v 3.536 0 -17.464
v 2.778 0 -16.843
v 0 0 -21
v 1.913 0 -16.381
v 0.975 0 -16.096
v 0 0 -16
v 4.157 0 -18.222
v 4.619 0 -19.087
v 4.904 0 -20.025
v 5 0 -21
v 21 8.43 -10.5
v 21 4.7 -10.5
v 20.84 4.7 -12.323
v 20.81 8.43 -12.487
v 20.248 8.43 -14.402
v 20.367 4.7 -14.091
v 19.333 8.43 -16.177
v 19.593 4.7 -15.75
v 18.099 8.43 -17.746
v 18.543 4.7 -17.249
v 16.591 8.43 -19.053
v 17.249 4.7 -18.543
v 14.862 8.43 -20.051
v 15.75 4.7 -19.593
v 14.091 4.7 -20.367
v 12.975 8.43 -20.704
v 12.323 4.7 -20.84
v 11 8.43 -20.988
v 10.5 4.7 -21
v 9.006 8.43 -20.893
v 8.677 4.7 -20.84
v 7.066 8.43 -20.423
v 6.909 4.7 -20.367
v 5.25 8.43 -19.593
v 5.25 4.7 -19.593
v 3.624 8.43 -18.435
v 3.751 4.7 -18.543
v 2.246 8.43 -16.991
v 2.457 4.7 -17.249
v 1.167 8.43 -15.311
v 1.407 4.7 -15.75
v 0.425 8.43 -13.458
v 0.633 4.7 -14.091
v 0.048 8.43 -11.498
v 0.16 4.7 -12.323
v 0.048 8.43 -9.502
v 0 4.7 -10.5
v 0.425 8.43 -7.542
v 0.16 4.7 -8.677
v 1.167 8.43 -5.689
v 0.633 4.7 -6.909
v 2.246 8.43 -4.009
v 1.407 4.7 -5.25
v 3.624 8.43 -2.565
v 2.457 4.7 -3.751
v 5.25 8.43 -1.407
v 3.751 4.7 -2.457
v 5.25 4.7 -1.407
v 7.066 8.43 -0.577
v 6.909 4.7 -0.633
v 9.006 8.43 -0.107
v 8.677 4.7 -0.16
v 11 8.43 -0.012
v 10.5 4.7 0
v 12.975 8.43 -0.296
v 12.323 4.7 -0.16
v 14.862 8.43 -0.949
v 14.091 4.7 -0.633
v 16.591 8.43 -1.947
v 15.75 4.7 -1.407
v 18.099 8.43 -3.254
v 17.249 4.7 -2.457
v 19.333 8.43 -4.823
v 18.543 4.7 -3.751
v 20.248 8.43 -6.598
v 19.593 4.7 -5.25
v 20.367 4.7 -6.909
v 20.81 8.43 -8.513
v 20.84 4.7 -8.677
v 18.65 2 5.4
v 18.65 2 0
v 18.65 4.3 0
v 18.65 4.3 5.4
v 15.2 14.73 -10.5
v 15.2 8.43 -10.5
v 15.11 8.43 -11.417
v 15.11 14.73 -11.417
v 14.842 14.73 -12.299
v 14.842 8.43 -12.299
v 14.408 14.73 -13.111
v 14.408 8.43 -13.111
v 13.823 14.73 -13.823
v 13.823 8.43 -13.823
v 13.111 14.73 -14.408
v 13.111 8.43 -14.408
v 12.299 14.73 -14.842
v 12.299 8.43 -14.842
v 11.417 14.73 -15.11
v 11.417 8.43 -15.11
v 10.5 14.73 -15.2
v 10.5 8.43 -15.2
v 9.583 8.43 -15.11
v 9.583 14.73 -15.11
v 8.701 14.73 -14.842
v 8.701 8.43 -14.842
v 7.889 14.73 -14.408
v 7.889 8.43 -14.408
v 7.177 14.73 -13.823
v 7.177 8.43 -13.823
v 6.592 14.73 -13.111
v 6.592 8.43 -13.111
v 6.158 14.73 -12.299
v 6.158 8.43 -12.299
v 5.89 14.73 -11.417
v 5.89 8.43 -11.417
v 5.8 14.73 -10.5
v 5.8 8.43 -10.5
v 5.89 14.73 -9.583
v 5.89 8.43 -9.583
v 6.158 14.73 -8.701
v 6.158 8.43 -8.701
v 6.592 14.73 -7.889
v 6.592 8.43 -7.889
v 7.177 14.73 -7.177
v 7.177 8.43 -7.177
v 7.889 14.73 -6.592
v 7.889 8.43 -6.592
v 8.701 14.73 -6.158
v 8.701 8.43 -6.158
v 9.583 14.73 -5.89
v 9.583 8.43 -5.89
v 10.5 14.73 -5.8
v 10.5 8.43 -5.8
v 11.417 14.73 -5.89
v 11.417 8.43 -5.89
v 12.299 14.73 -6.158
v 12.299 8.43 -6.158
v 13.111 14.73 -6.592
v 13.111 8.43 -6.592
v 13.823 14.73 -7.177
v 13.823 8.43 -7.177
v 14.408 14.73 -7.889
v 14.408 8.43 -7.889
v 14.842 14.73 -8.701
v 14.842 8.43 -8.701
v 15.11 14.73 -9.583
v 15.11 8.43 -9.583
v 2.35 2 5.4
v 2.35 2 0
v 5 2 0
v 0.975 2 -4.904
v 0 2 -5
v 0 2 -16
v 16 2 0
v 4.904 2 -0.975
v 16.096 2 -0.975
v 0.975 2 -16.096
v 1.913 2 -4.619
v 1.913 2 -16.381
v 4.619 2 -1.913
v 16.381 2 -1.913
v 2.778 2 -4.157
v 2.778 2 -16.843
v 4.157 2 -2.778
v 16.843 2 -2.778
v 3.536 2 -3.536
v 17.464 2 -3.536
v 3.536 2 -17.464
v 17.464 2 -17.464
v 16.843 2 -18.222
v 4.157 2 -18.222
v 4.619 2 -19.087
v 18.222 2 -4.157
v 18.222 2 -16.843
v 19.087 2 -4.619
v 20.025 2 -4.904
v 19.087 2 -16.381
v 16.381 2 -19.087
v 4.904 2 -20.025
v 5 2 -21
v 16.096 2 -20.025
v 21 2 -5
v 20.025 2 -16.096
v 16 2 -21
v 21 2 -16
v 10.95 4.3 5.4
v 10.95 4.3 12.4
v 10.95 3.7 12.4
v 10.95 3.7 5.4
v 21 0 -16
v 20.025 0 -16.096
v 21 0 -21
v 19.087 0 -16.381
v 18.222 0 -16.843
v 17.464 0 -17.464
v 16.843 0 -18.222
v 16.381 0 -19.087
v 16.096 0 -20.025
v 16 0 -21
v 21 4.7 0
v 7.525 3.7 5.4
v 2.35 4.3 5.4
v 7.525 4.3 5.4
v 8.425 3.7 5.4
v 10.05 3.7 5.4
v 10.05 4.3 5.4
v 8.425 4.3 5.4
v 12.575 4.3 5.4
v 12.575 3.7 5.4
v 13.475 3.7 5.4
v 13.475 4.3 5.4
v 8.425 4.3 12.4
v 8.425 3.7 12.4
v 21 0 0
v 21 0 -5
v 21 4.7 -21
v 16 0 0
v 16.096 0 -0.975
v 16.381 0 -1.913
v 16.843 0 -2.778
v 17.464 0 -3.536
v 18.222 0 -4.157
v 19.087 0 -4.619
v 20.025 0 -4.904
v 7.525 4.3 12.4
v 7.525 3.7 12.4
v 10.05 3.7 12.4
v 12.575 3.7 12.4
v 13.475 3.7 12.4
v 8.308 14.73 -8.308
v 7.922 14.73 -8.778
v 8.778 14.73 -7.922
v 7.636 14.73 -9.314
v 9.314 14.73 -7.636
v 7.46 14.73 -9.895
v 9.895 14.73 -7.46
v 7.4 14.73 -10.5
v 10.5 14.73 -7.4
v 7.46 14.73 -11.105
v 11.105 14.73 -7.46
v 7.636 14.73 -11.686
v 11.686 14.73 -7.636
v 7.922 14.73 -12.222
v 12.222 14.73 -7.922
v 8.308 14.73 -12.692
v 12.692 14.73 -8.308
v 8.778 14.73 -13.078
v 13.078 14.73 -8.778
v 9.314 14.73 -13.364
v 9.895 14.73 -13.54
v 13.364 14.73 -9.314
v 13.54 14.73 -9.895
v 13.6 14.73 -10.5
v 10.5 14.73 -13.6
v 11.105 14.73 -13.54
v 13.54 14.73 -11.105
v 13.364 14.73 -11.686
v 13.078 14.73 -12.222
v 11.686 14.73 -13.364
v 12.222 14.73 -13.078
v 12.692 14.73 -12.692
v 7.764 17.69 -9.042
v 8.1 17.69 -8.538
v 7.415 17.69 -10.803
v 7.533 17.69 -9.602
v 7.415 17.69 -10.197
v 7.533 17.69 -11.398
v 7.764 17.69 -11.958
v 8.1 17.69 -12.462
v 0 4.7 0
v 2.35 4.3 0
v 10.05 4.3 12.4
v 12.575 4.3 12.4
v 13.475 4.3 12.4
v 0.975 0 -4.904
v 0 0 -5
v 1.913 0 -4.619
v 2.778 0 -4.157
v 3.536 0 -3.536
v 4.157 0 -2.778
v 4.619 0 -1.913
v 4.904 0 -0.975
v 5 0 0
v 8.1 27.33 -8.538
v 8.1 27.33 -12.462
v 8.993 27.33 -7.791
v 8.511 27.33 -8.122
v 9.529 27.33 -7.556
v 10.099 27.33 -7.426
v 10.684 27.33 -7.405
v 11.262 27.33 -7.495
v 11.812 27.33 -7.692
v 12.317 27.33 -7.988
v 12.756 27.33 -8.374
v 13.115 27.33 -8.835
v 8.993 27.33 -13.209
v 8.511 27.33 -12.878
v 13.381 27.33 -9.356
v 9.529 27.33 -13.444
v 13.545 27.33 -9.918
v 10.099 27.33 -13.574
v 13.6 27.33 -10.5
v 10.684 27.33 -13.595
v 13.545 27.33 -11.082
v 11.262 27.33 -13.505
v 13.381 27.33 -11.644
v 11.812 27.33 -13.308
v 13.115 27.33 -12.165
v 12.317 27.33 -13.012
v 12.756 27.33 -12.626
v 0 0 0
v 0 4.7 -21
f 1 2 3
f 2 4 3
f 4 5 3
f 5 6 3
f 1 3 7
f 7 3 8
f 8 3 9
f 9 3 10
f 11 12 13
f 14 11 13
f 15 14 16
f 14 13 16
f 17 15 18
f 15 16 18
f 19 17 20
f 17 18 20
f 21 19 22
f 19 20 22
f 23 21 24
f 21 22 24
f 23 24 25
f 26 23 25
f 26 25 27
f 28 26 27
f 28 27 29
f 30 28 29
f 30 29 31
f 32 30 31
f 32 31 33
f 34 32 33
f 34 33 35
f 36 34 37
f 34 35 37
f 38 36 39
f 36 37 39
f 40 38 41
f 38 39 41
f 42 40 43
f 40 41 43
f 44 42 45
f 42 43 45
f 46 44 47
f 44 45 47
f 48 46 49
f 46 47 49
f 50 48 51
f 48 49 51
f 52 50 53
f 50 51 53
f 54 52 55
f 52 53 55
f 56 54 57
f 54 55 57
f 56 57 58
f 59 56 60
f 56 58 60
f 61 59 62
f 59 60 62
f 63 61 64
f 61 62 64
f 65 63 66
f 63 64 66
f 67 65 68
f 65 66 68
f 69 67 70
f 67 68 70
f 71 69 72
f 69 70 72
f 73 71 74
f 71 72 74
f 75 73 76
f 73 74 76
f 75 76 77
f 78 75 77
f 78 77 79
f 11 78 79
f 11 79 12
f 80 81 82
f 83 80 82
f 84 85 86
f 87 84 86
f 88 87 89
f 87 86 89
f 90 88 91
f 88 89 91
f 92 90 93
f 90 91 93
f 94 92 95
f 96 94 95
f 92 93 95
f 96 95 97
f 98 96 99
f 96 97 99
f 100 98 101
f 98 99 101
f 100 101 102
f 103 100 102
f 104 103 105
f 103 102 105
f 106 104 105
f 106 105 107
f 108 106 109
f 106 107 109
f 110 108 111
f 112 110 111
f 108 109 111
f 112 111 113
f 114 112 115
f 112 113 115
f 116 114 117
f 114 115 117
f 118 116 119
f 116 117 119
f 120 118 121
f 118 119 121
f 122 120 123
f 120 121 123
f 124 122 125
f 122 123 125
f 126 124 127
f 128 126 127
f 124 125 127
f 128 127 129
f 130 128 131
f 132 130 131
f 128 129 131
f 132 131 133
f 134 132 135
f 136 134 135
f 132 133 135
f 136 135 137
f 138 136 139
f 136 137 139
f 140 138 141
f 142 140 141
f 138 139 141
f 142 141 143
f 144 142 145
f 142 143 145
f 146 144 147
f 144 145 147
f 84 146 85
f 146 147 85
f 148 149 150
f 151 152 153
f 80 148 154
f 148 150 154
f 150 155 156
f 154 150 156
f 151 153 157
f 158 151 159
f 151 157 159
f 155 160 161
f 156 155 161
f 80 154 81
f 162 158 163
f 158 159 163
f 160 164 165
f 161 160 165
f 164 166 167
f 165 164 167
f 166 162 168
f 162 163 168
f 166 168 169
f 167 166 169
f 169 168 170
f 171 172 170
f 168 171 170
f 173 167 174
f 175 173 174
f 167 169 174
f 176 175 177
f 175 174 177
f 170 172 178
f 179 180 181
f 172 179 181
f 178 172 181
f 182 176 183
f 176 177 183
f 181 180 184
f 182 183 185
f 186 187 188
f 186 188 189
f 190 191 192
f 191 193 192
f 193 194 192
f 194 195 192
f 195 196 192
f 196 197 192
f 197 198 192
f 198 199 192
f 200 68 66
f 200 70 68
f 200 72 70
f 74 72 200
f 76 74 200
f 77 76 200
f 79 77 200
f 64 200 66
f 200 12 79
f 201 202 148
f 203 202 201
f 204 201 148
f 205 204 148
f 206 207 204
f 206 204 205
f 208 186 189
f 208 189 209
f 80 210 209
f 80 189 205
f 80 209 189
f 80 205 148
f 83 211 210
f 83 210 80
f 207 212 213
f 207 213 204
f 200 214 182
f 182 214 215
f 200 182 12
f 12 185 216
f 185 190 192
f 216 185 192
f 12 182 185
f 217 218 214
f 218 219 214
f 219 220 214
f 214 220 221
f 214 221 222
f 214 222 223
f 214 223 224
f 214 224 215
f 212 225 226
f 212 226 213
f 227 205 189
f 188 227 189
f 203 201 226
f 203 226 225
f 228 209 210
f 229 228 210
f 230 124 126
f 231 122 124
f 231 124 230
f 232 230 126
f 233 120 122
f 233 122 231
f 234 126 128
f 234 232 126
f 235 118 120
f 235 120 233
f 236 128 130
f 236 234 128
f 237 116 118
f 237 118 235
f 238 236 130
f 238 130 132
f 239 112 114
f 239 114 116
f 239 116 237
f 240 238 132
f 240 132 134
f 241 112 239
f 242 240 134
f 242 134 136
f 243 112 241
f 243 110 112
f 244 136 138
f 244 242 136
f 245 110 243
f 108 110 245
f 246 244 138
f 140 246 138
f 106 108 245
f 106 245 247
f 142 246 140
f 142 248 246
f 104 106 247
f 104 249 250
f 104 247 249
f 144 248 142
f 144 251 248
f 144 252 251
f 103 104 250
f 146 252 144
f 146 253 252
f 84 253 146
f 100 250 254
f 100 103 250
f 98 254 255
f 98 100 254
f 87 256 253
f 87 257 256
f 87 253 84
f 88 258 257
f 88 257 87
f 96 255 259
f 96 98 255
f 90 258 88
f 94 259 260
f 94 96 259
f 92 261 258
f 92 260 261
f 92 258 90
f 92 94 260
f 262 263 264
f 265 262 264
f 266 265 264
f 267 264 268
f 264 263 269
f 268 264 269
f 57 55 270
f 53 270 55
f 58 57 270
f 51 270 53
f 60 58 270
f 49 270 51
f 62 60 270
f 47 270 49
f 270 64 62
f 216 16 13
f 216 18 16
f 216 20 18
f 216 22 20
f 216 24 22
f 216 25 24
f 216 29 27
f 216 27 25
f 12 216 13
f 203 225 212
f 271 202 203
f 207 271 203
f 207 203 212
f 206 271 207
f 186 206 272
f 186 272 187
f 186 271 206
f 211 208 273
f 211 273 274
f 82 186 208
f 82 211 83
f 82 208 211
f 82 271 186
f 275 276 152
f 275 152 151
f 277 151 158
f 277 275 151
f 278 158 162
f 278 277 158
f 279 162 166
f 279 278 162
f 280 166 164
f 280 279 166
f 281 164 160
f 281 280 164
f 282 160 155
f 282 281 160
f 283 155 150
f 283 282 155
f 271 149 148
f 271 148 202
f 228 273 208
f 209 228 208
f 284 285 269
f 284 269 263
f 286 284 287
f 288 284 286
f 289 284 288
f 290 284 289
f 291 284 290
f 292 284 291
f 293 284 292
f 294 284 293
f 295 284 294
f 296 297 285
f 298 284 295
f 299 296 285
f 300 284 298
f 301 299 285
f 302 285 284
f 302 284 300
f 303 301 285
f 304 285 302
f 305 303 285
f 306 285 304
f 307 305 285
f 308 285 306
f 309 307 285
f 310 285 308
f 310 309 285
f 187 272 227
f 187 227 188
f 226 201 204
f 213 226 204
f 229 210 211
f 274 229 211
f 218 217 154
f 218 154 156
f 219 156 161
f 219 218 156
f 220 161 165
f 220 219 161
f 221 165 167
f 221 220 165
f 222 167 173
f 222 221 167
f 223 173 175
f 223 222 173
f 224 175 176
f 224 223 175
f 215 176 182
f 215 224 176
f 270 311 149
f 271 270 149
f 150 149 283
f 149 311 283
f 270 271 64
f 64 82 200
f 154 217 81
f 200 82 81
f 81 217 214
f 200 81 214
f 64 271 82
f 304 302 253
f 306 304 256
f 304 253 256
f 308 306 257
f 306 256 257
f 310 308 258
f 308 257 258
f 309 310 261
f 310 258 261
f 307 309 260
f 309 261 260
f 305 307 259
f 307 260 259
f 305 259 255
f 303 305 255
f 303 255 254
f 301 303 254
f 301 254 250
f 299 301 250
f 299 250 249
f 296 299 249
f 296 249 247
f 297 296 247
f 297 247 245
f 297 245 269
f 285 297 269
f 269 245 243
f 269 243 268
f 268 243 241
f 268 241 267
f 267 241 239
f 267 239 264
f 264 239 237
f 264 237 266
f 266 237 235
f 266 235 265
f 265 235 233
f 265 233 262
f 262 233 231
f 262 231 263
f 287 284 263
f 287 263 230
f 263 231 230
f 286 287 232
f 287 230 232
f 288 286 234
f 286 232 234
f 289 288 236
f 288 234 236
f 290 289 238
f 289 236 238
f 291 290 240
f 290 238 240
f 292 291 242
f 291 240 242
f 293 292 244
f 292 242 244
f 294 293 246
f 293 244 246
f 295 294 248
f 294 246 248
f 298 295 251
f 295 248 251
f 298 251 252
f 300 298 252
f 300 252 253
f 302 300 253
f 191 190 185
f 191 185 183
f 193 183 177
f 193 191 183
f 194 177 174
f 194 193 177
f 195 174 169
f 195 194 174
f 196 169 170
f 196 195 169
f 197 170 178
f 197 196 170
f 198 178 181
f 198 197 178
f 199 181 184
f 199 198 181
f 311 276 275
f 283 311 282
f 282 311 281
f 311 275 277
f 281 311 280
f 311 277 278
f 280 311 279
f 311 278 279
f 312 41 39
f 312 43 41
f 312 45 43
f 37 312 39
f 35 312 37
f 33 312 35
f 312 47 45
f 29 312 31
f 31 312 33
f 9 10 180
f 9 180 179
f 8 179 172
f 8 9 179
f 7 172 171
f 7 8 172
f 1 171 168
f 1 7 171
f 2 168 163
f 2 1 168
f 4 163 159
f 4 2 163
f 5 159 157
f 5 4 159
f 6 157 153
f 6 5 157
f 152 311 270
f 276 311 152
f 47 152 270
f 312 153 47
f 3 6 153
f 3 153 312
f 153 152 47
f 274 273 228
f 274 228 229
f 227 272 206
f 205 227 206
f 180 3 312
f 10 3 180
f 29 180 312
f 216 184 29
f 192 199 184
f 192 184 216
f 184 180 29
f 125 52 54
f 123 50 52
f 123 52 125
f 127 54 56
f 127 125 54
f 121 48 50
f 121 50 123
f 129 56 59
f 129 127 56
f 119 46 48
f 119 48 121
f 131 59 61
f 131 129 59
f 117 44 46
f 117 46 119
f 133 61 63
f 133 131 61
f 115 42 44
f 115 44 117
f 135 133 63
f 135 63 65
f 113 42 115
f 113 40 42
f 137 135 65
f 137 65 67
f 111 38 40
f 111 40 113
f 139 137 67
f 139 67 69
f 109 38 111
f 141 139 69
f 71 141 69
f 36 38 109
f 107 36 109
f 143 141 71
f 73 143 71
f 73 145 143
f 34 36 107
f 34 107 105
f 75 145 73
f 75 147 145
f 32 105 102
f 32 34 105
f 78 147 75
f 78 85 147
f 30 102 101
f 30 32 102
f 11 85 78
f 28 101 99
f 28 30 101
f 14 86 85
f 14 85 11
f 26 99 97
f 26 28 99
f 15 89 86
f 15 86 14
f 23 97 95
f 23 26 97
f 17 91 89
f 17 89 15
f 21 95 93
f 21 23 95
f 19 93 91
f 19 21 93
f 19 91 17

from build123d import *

# Parameters (mm, degrees)
SKETCH1_W               = 21
SKETCH1_H               = 21
BOSS_EXTRUDE1_DEPTH     = 4.7
SKETCH2_R               = 10.5
BOSS_EXTRUDE2_DEPTH     = 3.73
SKETCH3_R               = 4.7
BOSS_EXTRUDE3_DEPTH     = 6.3
SKETCH4_R               = 3.1
BOSS_EXTRUDE4_DEPTH     = 12.6
CUT_EXTRUDE1_DEPTH      = 2
SKETCH6_W               = 16.3
SKETCH6_H               = 2.3
BOSS_EXTRUDE5_DEPTH     = 5.4
SKETCH7_W               = 5.95
SKETCH7_H               = 0.6
BOSS_EXTRUDE6_DEPTH     = 7
SKETCH8_W               = 1.625
SKETCH8_H               = 7
CUT_EXTRUDE2_DEPTH      = 24.03
CUT_EXTRUDE2_DEPTH_BACK = 5.3
CUT_EXTRUDE3_DEPTH      = 9.64


with BuildPart() as part:
    # Sketch1 → Boss-Extrude1 (new body)
    with BuildSketch(Plane(origin=(0, 0, 0), x_dir=(1, 0, 0), z_dir=(0, 1, 0))):
        with Locations((10.5, 10.5)):
            Rectangle(SKETCH1_W, SKETCH1_H)
    extrude(amount=BOSS_EXTRUDE1_DEPTH)

    # Sketch2 → Boss-Extrude2 (add)
    with BuildSketch(Plane(origin=(0, 4.7, 0), x_dir=(1, 0, 0), z_dir=(0, 1, 0))):
        with Locations((10.5, 10.5)):
            Circle(SKETCH2_R)
    extrude(amount=BOSS_EXTRUDE2_DEPTH)

    # Sketch3 → Boss-Extrude3 (add)
    with BuildSketch(Plane(origin=(0, 8.43, 0), x_dir=(1, 0, 0), z_dir=(0, 1, 0))):
        with Locations((10.5, 10.5)):
            Circle(SKETCH3_R)
    extrude(amount=BOSS_EXTRUDE3_DEPTH)

    # Sketch4 → Boss-Extrude4 (add)
    with BuildSketch(Plane(origin=(0, 14.73, 0), x_dir=(1, 0, 0), z_dir=(0, 1, 0))):
        with Locations((10.5, 10.5)):
            Circle(SKETCH4_R)
    extrude(amount=BOSS_EXTRUDE4_DEPTH)

    # Sketch5 → Cut-Extrude1 (cut)
    with BuildSketch(Plane.XZ):
        with BuildLine():
            Line((5, 0), (16, 0))
            ThreePointArc((16, 0), (17.464466094, -3.535533906), (21, -5))
            Line((21, -5), (21, -16))
            ThreePointArc((21, -16), (17.464466094, -17.464466094), (16, -21))
            Line((16, -21), (5, -21))
            ThreePointArc((5, -21), (3.535533906, -17.464466094), (0, -16))
            Line((0, -16), (0, -5))
            ThreePointArc((0, -5), (3.535533906, -3.535533906), (5, 0))
        make_face()
    extrude(amount=-CUT_EXTRUDE1_DEPTH, mode=Mode.SUBTRACT)

    # Sketch6 → Boss-Extrude5 (add)
    with BuildSketch(Plane.XY):
        with Locations((10.5, 3.15)):
            Rectangle(SKETCH6_W, SKETCH6_H)
    extrude(amount=BOSS_EXTRUDE5_DEPTH)

    # Sketch7 → Boss-Extrude6 (add)
    with BuildSketch(Plane.XY.offset(5.4)):
        with Locations((10.5, 4)):
            Rectangle(SKETCH7_W, SKETCH7_H)
    extrude(amount=BOSS_EXTRUDE6_DEPTH)

    # Sketch8 → Cut-Extrude2 (cut, two sides)
    with BuildSketch(Plane(origin=(0, 4.3, 0), x_dir=(1, 0, 0), z_dir=(0, 1, 0))) as cut_extrude2_sk:
        with Locations((9.2375, -8.9)):
            Rectangle(SKETCH8_W, SKETCH8_H)
        with Locations((11.7625, -8.9)):
            Rectangle(SKETCH8_W, SKETCH8_H)
    extrude(amount=CUT_EXTRUDE2_DEPTH, mode=Mode.SUBTRACT)
    extrude(cut_extrude2_sk.sketch, amount=-CUT_EXTRUDE2_DEPTH_BACK, mode=Mode.SUBTRACT)

    # Sketch9 → Cut-Extrude3 (cut)
    with BuildSketch(Plane(origin=(0, 27.33, 0), x_dir=(1, 0, 0), z_dir=(0, 1, 0))):
        with BuildLine():
            Line((8.1, 12.462141687), (8.1, 8.537858313))
            ThreePointArc((8.1, 8.537858313), (7.4, 10.5), (8.1, 12.462141687))
        make_face()
    extrude(amount=-CUT_EXTRUDE3_DEPTH, mode=Mode.SUBTRACT)


solid = part.part
